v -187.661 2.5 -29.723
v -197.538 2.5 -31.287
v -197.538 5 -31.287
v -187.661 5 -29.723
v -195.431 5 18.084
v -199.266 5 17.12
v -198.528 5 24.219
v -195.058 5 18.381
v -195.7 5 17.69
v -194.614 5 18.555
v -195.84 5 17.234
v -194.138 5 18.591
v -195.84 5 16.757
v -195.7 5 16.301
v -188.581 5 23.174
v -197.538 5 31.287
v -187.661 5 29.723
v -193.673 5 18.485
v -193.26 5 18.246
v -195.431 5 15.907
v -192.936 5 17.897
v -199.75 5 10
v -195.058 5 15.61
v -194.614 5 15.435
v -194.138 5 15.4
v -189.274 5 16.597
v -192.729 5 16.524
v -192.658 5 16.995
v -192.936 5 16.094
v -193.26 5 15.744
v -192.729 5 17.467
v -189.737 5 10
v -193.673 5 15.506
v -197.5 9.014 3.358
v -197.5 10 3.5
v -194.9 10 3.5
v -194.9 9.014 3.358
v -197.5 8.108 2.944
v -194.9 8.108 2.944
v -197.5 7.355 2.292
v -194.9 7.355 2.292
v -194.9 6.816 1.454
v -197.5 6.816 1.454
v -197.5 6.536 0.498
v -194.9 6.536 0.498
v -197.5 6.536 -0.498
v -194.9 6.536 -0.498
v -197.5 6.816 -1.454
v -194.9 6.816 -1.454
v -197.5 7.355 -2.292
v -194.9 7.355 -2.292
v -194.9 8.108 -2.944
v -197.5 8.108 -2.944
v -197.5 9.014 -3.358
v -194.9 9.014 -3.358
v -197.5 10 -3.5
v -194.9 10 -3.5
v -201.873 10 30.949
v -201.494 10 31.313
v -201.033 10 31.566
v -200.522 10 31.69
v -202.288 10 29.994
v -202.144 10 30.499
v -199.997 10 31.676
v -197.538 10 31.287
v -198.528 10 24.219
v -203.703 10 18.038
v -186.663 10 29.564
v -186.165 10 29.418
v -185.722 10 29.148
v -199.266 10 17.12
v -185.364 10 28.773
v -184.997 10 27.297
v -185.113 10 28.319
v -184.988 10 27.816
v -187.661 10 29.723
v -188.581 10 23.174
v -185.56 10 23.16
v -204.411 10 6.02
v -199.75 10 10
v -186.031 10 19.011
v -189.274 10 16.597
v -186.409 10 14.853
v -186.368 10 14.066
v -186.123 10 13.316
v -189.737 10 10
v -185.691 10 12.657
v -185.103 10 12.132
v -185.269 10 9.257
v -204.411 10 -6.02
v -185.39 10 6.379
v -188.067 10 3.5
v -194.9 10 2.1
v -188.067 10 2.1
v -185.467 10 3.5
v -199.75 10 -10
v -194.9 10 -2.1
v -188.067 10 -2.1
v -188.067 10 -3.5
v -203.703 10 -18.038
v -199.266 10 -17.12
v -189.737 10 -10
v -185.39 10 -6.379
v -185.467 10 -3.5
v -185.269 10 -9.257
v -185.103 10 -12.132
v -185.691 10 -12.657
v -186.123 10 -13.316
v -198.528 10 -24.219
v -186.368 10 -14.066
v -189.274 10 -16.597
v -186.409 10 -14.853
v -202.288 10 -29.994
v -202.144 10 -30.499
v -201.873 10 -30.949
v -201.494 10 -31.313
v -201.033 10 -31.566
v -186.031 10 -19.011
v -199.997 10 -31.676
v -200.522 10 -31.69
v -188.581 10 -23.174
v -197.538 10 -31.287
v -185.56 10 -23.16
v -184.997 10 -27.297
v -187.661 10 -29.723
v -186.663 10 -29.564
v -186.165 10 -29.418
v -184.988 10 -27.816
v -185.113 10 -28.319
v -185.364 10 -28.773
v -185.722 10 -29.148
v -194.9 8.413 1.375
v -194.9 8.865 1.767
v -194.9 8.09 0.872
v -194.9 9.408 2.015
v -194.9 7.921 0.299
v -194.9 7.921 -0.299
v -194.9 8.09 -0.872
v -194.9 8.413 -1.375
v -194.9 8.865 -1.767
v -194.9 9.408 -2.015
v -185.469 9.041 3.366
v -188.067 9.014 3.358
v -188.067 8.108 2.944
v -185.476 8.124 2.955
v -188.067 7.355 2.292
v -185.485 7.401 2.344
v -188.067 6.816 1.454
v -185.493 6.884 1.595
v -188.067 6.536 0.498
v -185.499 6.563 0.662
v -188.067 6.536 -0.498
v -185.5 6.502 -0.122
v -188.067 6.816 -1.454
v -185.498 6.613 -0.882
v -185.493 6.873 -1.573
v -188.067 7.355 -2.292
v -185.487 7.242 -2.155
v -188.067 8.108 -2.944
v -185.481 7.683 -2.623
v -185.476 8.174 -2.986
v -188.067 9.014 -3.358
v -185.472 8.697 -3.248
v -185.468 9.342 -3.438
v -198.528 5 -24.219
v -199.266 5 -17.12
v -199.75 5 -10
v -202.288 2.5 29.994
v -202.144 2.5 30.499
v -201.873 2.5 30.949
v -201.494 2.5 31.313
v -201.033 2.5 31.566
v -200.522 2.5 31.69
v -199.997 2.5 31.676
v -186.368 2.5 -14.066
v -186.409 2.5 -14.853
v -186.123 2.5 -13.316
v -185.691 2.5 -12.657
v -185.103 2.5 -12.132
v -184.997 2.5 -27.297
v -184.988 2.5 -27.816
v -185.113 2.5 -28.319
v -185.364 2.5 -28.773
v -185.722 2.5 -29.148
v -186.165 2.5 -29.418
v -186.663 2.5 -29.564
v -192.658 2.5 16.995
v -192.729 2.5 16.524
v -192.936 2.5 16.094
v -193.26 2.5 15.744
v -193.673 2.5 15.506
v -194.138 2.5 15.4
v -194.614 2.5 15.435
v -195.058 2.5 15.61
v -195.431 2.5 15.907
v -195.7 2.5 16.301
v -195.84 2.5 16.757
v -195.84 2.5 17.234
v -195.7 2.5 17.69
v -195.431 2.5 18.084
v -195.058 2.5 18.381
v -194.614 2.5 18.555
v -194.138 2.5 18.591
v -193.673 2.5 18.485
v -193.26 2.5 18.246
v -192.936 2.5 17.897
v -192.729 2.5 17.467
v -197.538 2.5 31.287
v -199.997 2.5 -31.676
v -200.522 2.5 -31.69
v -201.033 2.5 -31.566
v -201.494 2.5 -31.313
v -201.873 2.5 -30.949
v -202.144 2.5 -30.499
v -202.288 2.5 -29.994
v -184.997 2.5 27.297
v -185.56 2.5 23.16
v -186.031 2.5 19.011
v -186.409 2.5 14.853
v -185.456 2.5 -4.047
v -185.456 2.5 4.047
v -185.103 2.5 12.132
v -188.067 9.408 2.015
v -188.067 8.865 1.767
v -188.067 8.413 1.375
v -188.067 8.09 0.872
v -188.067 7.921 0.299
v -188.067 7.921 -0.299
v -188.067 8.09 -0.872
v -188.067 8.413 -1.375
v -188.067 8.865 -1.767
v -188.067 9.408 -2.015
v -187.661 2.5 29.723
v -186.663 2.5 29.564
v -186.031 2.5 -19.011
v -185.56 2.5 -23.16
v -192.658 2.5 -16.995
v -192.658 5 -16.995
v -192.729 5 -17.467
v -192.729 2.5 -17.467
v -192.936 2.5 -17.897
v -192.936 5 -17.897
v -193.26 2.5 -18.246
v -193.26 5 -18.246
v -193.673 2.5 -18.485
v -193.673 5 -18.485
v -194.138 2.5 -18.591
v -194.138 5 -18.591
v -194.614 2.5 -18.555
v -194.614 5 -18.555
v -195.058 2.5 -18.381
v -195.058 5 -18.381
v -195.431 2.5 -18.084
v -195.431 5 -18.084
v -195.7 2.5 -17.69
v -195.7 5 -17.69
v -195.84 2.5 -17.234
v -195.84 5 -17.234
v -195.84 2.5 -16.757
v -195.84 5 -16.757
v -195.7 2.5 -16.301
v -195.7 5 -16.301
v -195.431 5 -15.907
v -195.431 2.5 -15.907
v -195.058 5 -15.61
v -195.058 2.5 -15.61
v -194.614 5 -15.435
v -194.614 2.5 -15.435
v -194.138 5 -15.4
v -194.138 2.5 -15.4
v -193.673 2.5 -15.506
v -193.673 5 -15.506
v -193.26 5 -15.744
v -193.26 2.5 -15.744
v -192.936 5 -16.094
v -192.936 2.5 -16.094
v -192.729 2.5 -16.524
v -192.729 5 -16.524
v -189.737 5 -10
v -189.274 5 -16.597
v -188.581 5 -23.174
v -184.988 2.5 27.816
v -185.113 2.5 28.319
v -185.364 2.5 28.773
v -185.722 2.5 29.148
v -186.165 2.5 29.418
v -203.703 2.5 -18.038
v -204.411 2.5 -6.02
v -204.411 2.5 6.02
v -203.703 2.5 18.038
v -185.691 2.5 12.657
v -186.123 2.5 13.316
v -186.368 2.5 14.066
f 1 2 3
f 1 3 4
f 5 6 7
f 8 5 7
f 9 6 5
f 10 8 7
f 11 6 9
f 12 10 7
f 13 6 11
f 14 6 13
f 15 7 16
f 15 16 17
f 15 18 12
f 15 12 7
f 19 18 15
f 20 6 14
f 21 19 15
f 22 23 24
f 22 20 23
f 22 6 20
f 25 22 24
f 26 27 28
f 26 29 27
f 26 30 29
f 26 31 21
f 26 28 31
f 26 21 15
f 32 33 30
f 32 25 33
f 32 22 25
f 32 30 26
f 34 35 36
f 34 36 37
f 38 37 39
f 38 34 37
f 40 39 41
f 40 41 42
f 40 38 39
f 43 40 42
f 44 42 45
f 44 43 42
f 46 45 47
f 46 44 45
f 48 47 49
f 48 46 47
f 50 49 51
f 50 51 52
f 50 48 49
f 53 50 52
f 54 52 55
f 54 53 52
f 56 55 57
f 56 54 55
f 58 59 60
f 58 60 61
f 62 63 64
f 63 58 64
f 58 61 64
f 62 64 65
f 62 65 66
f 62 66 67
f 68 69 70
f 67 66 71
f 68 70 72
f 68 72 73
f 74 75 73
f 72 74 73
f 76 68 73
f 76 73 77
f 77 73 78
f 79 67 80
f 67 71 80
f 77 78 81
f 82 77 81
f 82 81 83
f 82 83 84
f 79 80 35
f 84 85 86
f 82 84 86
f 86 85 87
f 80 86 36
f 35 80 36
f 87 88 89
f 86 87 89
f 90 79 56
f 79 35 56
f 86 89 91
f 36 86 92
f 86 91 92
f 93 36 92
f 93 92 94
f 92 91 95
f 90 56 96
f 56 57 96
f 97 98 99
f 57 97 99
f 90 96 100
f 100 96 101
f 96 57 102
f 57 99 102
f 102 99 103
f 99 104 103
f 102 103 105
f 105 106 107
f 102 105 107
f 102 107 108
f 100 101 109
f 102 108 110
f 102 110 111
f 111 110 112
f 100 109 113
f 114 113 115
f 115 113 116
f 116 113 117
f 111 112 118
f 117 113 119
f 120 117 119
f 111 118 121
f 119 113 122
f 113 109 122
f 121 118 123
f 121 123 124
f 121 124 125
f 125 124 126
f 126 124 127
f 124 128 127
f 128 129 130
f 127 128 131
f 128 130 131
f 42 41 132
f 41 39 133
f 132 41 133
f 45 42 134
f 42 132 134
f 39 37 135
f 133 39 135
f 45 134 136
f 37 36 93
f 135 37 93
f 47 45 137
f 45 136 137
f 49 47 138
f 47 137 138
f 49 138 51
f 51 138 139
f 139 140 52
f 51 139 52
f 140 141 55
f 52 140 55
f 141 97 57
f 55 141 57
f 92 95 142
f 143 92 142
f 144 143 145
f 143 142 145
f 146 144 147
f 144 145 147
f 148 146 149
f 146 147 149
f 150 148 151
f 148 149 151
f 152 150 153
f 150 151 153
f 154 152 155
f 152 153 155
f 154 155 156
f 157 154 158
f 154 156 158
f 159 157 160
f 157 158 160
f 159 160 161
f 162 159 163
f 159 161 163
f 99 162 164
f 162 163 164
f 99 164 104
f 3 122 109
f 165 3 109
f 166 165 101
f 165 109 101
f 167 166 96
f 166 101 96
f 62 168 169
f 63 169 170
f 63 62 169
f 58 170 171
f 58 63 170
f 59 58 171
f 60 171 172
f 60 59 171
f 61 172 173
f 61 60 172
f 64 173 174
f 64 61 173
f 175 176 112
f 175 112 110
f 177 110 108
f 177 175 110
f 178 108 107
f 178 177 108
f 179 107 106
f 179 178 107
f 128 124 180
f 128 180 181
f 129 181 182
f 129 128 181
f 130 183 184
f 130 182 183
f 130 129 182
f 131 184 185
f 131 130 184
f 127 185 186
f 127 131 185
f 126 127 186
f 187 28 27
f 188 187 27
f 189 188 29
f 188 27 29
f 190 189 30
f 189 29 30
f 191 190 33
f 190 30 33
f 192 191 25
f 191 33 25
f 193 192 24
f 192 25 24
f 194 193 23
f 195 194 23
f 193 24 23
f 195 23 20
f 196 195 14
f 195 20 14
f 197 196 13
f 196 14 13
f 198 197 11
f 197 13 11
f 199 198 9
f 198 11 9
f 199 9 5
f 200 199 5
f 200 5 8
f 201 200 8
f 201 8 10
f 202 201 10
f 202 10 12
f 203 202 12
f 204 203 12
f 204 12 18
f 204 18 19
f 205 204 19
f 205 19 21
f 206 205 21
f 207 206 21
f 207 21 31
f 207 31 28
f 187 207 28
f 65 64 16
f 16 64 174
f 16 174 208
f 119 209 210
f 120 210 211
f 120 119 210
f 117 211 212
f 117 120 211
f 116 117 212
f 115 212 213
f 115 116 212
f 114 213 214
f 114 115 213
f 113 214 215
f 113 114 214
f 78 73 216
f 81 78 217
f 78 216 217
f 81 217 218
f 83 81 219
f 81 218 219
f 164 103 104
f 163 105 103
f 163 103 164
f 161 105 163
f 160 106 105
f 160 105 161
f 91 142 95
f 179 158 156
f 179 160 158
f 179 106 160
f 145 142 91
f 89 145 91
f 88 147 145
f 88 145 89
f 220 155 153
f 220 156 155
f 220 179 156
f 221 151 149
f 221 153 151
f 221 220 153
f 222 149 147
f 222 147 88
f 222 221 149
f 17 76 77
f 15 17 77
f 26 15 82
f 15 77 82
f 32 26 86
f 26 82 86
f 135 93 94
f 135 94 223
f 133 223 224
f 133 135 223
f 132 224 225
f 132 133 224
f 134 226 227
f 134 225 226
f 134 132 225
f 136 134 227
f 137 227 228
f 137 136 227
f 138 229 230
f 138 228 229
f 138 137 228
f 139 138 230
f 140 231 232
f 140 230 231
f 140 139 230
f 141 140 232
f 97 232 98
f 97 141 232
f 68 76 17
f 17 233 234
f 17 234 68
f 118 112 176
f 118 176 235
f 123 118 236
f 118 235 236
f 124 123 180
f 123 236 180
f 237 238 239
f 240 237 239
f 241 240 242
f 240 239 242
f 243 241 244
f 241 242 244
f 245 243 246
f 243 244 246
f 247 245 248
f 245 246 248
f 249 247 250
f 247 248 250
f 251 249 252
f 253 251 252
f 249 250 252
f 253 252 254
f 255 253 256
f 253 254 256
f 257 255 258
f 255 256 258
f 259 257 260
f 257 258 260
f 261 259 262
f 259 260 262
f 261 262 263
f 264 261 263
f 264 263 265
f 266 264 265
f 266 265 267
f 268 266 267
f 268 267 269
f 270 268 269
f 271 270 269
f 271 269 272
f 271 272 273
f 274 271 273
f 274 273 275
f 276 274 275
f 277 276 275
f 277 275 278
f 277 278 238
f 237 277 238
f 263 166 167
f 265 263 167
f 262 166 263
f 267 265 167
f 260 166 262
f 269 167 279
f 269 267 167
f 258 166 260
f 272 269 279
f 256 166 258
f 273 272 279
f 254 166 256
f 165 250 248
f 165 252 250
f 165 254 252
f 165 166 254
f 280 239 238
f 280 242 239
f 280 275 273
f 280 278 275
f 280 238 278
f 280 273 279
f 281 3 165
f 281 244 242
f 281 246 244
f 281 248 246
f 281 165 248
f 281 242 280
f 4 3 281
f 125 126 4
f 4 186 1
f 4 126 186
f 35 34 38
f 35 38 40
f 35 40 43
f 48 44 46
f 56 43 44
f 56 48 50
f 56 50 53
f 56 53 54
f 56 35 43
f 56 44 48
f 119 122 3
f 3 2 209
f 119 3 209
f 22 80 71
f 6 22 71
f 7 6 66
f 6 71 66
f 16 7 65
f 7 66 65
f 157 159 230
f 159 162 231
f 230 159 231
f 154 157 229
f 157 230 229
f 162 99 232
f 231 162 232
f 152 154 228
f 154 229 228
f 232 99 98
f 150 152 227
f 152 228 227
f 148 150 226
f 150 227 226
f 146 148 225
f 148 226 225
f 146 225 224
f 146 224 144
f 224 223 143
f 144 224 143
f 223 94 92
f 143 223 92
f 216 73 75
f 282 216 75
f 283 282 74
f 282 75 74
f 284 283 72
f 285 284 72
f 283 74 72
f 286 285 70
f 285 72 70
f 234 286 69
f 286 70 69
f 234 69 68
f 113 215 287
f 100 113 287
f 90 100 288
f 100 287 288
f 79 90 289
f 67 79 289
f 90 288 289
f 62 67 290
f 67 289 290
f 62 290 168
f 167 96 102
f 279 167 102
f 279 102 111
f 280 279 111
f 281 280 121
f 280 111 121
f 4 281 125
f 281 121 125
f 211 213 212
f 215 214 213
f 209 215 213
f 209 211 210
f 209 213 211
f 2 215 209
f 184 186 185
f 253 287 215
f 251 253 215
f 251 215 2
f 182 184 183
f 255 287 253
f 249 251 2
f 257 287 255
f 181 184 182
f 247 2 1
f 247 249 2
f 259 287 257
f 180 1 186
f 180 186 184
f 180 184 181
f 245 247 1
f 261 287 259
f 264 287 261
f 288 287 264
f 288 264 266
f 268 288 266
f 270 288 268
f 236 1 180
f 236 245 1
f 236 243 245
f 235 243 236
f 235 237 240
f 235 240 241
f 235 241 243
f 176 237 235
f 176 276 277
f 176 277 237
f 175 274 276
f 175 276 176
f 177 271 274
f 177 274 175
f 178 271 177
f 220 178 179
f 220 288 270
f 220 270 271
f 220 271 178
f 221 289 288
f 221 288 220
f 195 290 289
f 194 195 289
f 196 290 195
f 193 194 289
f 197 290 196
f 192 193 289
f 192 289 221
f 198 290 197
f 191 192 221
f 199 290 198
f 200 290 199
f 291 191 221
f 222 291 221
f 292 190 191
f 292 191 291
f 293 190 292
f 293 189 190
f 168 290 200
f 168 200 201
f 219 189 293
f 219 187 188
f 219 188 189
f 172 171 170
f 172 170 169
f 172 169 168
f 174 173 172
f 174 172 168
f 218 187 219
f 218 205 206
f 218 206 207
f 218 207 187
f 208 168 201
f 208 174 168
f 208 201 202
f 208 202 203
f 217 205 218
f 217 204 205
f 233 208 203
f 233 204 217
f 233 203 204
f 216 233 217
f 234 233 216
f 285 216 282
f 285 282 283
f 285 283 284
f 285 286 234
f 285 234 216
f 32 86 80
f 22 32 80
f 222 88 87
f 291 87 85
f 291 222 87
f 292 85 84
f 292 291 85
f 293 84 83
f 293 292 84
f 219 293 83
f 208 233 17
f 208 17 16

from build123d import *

# Parameters (mm, degrees)
BOSS_EXTRUDE1_DEPTH        = 10
CUT_EXTRUDE1_DEPTH         = 5
F_3_2_3_2_DIAMETER_HOLE1_D = 3.2
BOSS_EXTRUDE2_DEPTH        = 10
FILLET1_R                  = 3
FILLET2_R                  = 2
SKETCH21_R                 = 2.1
CUT_EXTRUDE2_DEPTH         = 36.522103107
SKETCH22_R                 = 3.5
CUT_EXTRUDE3_DEPTH         = 2.6
CUT_EXTRUDE6_DEPTH         = 2.5
SKETCH27_W                 = 2.6
SKETCH27_H                 = 3.5


with BuildPart() as part:
    # Sketch1 → Boss-Extrude1 (new body)
    with BuildSketch(Plane(origin=(0, 0, 0), x_dir=(1, 0, 0), z_dir=(0, 1, 0))):
        with BuildLine():
            ThreePointArc((-187.660784713, 29.722548358), (-190, 0), (-187.660784713, -29.722548358))
            Line((-187.660784713, -29.722548358), (-197.537668119, -31.286893008))
            ThreePointArc((-197.537668119, -31.286893008), (-200, 0), (-197.537668119, 31.286893008))
            Line((-197.537668119, 31.286893008), (-187.660784713, 29.722548358))
        make_face()
        with BuildLine():
            ThreePointArc((-197.537668119, -31.286893008), (-200, 0), (-197.537668119, 31.286893008))
            Line((-197.537668119, 31.286893008), (-201.982265652, 31.990848101))
            ThreePointArc((-201.982265652, 31.990848101), (-204.5, 0), (-201.982265652, -31.990848101))
            Line((-201.982265652, -31.990848101), (-197.537668119, -31.286893008))
        make_face()
        with BuildLine():
            Line((-184.697719691, 29.253244963), (-187.660784713, 29.722548358))
            ThreePointArc((-187.660784713, 29.722548358), (-190, 0), (-187.660784713, -29.722548358))
            Line((-187.660784713, -29.722548358), (-184.697719691, -29.253244963))
            ThreePointArc((-184.697719691, -29.253244963), (-187, 0), (-184.697719691, 29.253244963))
        make_face()
    extrude(amount=BOSS_EXTRUDE1_DEPTH)

    # Sketch15 → Cut-Extrude1 (cut)
    with BuildSketch(Plane(origin=(0, 10, 0), x_dir=(1, 0, 0), z_dir=(0, 1, 0))):
        with BuildLine():
            Line((-199.749843554, 10), (-189.73665961, 10))
            ThreePointArc((-189.73665961, 10), (-188.956218405, 19.88837666), (-187.660784713, 29.722548358))
            Line((-187.660784713, 29.722548358), (-197.537668119, 31.286893008))
            ThreePointArc((-197.537668119, 31.286893008), (-198.928692466, 20.673057674), (-199.749843554, 10))
        make_face()
        with BuildLine():
            ThreePointArc((-187.660784713, -29.722548358), (-188.956218405, -19.88837666), (-189.73665961, -10))
            Line((-189.73665961, -10), (-199.749843554, -10))
            ThreePointArc((-199.749843554, -10), (-198.928692466, -20.673057674), (-197.537668119, -31.286893008))
            Line((-197.537668119, -31.286893008), (-187.660784713, -29.722548358))
        make_face()
    extrude(amount=-CUT_EXTRUDE1_DEPTH, mode=Mode.SUBTRACT)

    # Ø3.2 (3.2) Diameter Hole1 (through all)
    with Locations(Plane(origin=(0, 0, 0), x_dir=(-1, 0, 0), z_dir=(0, -1, 0))):
        with Locations((194.257966128, -16.995369836), (194.257966128, 16.995369836)):
            Hole(F_3_2_3_2_DIAMETER_HOLE1_D / 2)

    # Sketch19 → Boss-Extrude2 (add)
    with BuildSketch(Plane(origin=(0, 0, 0), x_dir=(1, 0, 0), z_dir=(0, 1, 0))):
        with BuildLine():
            Line((-185.102830261, -12.132280472), (-186.599618646, -12.230385166))
            ThreePointArc((-186.599618646, -12.230385166), (-187, 0), (-186.599618646, 12.230385166))
            Line((-186.599618646, 12.230385166), (-185.102830261, 12.132280472))
            ThreePointArc((-185.102830261, 12.132280472), (-185.5, 0), (-185.102830261, -12.132280472))
        make_face()
    extrude(amount=BOSS_EXTRUDE2_DEPTH)

    # Fillet1
    # the kernel refuses this fillet: 3 mm, written as the material it adds along each edge
    with BuildSketch(Plane(origin=(-186.599618646, 0, -12.230385166), x_dir=(0.07241784502459461, 0, -0.9973743809232287), z_dir=(0, 1, 0))) as fillet1_piece_1:
        with BuildLine():
            CenterArc((2.608644701, -2.999925838), FILLET1_R, 89.597127862, 60.403689883)
            Line((0.010547081, -1.499962919), (-0.041414871, -1.469963661))
            ThreePointArc((-0.041414871, -1.469963661), (-0.054724976, -0.750403343), (-0.059998517, -0.000421883))
            Line((-0.059998517, -0.000421883), (-0.000421883, 0.059998517))
            ThreePointArc((-0.000421883, 0.059998517), (1.314869431, 0.064622735), (2.630160746, 0.059998517))
            Line((2.630160746, 0.059998517), (2.629738863, 0))
        make_face()
    extrude(amount=10)
    with BuildSketch(Plane(origin=(-186.599618646, 0, 12.230385166), x_dir=(0.0724178450245846, 0, 0.9973743809232295), z_dir=(0, 1, 0))) as fillet1_piece_2:
        with BuildLine():
            CenterArc((2.608644701, 2.999925838), FILLET1_R, 209.999182255, 60.403689883)
            Line((0.010547081, 1.499962919), (-0.041414871, 1.469963661))
            ThreePointArc((-0.041414871, 1.469963661), (-0.054724976, 0.750403343), (-0.059998517, 0.000421883))
            Line((-0.059998517, 0.000421883), (-0.000421883, -0.059998517))
            ThreePointArc((-0.000421883, -0.059998517), (1.314869431, -0.064622735), (2.630160746, -0.059998517))
            Line((2.630160746, -0.059998517), (2.629738863, 0))
        make_face()
    extrude(amount=10)

    # Fillet2
    fillet2_edges = [part.edges().sort_by_distance(p)[0] for p in [
        (-201.982265652, 5, 31.990848101),
        (-201.982265652, 5, -31.990848101),
        (-184.697719691, 5, -29.253244963),
        (-184.697719691, 5, 29.253244963),
    ]]
    fillet(fillet2_edges, radius=FILLET2_R)

    # Sketch21 → Cut-Extrude2 (cut, through all)
    with BuildSketch(Plane(origin=(-197.5, 0, 0), x_dir=(0, 0, -1), z_dir=(1, 0, 0))):
        with Locations((0, 10)):
            Circle(SKETCH21_R)
    extrude(amount=CUT_EXTRUDE2_DEPTH, mode=Mode.SUBTRACT)

    # Sketch22 → Cut-Extrude3 (cut)
    with BuildSketch(Plane(origin=(-197.5, 0, 0), x_dir=(0, 0, -1), z_dir=(1, 0, 0))):
        with Locations((0, 10)):
            Circle(SKETCH22_R)
    extrude(amount=CUT_EXTRUDE3_DEPTH, mode=Mode.SUBTRACT)

    # Sketch26 → Cut-Extrude6 (cut)
    with BuildSketch(Plane.XZ):
        with BuildLine():
            Line((-199.997133786, -31.676434101), (-186.662644351, -29.564458455))
            ThreePointArc((-186.662644351, -29.564458455), (-185.363721979, -28.773196969), (-184.996936421, -27.297133819))
            ThreePointArc((-184.996936421, -27.297133819), (-185.807261228, -21.087002508), (-186.409178624, -14.853219336))
            ThreePointArc((-186.409178624, -14.853219336), (-186.123110766, -13.316498702), (-185.102830261, -12.132280472))
            ThreePointArc((-185.102830261, -12.132280472), (-185.5, 0), (-185.102830261, 12.132280472))
            ThreePointArc((-185.102830261, 12.132280472), (-186.123110766, 13.316498702), (-186.409178624, 14.853219336))
            ThreePointArc((-186.409178624, 14.853219336), (-185.807261228, 21.087002508), (-184.996936421, 27.297133819))
            ThreePointArc((-184.996936421, 27.297133819), (-185.363721979, 28.773196969), (-186.662644351, 29.564458455))
            Line((-186.662644351, 29.564458455), (-199.997133786, 31.676434101))
            ThreePointArc((-199.997133786, 31.676434101), (-201.493549275, 31.313266322), (-202.288373113, 29.994401197))
            ThreePointArc((-202.288373113, 29.994401197), (-204.5, 0), (-202.288373113, -29.994401197))
            ThreePointArc((-202.288373113, -29.994401197), (-201.493549275, -31.313266322), (-199.997133786, -31.676434101))
        make_face()
    extrude(amount=-CUT_EXTRUDE6_DEPTH, mode=Mode.SUBTRACT)

    # Sketch27 → Cut-Revolve3 (revolve, cut)
    with BuildSketch(Plane(origin=(0, 10, 0), x_dir=(1, 0, 0), z_dir=(0, 1, 0))):
        with Locations((-186.766978193, 1.75)):
            Rectangle(SKETCH27_W, SKETCH27_H)
    revolve(axis=Axis((-197.5, 10, 0), (1, 0, 0)), mode=Mode.SUBTRACT)


solid = part.part
